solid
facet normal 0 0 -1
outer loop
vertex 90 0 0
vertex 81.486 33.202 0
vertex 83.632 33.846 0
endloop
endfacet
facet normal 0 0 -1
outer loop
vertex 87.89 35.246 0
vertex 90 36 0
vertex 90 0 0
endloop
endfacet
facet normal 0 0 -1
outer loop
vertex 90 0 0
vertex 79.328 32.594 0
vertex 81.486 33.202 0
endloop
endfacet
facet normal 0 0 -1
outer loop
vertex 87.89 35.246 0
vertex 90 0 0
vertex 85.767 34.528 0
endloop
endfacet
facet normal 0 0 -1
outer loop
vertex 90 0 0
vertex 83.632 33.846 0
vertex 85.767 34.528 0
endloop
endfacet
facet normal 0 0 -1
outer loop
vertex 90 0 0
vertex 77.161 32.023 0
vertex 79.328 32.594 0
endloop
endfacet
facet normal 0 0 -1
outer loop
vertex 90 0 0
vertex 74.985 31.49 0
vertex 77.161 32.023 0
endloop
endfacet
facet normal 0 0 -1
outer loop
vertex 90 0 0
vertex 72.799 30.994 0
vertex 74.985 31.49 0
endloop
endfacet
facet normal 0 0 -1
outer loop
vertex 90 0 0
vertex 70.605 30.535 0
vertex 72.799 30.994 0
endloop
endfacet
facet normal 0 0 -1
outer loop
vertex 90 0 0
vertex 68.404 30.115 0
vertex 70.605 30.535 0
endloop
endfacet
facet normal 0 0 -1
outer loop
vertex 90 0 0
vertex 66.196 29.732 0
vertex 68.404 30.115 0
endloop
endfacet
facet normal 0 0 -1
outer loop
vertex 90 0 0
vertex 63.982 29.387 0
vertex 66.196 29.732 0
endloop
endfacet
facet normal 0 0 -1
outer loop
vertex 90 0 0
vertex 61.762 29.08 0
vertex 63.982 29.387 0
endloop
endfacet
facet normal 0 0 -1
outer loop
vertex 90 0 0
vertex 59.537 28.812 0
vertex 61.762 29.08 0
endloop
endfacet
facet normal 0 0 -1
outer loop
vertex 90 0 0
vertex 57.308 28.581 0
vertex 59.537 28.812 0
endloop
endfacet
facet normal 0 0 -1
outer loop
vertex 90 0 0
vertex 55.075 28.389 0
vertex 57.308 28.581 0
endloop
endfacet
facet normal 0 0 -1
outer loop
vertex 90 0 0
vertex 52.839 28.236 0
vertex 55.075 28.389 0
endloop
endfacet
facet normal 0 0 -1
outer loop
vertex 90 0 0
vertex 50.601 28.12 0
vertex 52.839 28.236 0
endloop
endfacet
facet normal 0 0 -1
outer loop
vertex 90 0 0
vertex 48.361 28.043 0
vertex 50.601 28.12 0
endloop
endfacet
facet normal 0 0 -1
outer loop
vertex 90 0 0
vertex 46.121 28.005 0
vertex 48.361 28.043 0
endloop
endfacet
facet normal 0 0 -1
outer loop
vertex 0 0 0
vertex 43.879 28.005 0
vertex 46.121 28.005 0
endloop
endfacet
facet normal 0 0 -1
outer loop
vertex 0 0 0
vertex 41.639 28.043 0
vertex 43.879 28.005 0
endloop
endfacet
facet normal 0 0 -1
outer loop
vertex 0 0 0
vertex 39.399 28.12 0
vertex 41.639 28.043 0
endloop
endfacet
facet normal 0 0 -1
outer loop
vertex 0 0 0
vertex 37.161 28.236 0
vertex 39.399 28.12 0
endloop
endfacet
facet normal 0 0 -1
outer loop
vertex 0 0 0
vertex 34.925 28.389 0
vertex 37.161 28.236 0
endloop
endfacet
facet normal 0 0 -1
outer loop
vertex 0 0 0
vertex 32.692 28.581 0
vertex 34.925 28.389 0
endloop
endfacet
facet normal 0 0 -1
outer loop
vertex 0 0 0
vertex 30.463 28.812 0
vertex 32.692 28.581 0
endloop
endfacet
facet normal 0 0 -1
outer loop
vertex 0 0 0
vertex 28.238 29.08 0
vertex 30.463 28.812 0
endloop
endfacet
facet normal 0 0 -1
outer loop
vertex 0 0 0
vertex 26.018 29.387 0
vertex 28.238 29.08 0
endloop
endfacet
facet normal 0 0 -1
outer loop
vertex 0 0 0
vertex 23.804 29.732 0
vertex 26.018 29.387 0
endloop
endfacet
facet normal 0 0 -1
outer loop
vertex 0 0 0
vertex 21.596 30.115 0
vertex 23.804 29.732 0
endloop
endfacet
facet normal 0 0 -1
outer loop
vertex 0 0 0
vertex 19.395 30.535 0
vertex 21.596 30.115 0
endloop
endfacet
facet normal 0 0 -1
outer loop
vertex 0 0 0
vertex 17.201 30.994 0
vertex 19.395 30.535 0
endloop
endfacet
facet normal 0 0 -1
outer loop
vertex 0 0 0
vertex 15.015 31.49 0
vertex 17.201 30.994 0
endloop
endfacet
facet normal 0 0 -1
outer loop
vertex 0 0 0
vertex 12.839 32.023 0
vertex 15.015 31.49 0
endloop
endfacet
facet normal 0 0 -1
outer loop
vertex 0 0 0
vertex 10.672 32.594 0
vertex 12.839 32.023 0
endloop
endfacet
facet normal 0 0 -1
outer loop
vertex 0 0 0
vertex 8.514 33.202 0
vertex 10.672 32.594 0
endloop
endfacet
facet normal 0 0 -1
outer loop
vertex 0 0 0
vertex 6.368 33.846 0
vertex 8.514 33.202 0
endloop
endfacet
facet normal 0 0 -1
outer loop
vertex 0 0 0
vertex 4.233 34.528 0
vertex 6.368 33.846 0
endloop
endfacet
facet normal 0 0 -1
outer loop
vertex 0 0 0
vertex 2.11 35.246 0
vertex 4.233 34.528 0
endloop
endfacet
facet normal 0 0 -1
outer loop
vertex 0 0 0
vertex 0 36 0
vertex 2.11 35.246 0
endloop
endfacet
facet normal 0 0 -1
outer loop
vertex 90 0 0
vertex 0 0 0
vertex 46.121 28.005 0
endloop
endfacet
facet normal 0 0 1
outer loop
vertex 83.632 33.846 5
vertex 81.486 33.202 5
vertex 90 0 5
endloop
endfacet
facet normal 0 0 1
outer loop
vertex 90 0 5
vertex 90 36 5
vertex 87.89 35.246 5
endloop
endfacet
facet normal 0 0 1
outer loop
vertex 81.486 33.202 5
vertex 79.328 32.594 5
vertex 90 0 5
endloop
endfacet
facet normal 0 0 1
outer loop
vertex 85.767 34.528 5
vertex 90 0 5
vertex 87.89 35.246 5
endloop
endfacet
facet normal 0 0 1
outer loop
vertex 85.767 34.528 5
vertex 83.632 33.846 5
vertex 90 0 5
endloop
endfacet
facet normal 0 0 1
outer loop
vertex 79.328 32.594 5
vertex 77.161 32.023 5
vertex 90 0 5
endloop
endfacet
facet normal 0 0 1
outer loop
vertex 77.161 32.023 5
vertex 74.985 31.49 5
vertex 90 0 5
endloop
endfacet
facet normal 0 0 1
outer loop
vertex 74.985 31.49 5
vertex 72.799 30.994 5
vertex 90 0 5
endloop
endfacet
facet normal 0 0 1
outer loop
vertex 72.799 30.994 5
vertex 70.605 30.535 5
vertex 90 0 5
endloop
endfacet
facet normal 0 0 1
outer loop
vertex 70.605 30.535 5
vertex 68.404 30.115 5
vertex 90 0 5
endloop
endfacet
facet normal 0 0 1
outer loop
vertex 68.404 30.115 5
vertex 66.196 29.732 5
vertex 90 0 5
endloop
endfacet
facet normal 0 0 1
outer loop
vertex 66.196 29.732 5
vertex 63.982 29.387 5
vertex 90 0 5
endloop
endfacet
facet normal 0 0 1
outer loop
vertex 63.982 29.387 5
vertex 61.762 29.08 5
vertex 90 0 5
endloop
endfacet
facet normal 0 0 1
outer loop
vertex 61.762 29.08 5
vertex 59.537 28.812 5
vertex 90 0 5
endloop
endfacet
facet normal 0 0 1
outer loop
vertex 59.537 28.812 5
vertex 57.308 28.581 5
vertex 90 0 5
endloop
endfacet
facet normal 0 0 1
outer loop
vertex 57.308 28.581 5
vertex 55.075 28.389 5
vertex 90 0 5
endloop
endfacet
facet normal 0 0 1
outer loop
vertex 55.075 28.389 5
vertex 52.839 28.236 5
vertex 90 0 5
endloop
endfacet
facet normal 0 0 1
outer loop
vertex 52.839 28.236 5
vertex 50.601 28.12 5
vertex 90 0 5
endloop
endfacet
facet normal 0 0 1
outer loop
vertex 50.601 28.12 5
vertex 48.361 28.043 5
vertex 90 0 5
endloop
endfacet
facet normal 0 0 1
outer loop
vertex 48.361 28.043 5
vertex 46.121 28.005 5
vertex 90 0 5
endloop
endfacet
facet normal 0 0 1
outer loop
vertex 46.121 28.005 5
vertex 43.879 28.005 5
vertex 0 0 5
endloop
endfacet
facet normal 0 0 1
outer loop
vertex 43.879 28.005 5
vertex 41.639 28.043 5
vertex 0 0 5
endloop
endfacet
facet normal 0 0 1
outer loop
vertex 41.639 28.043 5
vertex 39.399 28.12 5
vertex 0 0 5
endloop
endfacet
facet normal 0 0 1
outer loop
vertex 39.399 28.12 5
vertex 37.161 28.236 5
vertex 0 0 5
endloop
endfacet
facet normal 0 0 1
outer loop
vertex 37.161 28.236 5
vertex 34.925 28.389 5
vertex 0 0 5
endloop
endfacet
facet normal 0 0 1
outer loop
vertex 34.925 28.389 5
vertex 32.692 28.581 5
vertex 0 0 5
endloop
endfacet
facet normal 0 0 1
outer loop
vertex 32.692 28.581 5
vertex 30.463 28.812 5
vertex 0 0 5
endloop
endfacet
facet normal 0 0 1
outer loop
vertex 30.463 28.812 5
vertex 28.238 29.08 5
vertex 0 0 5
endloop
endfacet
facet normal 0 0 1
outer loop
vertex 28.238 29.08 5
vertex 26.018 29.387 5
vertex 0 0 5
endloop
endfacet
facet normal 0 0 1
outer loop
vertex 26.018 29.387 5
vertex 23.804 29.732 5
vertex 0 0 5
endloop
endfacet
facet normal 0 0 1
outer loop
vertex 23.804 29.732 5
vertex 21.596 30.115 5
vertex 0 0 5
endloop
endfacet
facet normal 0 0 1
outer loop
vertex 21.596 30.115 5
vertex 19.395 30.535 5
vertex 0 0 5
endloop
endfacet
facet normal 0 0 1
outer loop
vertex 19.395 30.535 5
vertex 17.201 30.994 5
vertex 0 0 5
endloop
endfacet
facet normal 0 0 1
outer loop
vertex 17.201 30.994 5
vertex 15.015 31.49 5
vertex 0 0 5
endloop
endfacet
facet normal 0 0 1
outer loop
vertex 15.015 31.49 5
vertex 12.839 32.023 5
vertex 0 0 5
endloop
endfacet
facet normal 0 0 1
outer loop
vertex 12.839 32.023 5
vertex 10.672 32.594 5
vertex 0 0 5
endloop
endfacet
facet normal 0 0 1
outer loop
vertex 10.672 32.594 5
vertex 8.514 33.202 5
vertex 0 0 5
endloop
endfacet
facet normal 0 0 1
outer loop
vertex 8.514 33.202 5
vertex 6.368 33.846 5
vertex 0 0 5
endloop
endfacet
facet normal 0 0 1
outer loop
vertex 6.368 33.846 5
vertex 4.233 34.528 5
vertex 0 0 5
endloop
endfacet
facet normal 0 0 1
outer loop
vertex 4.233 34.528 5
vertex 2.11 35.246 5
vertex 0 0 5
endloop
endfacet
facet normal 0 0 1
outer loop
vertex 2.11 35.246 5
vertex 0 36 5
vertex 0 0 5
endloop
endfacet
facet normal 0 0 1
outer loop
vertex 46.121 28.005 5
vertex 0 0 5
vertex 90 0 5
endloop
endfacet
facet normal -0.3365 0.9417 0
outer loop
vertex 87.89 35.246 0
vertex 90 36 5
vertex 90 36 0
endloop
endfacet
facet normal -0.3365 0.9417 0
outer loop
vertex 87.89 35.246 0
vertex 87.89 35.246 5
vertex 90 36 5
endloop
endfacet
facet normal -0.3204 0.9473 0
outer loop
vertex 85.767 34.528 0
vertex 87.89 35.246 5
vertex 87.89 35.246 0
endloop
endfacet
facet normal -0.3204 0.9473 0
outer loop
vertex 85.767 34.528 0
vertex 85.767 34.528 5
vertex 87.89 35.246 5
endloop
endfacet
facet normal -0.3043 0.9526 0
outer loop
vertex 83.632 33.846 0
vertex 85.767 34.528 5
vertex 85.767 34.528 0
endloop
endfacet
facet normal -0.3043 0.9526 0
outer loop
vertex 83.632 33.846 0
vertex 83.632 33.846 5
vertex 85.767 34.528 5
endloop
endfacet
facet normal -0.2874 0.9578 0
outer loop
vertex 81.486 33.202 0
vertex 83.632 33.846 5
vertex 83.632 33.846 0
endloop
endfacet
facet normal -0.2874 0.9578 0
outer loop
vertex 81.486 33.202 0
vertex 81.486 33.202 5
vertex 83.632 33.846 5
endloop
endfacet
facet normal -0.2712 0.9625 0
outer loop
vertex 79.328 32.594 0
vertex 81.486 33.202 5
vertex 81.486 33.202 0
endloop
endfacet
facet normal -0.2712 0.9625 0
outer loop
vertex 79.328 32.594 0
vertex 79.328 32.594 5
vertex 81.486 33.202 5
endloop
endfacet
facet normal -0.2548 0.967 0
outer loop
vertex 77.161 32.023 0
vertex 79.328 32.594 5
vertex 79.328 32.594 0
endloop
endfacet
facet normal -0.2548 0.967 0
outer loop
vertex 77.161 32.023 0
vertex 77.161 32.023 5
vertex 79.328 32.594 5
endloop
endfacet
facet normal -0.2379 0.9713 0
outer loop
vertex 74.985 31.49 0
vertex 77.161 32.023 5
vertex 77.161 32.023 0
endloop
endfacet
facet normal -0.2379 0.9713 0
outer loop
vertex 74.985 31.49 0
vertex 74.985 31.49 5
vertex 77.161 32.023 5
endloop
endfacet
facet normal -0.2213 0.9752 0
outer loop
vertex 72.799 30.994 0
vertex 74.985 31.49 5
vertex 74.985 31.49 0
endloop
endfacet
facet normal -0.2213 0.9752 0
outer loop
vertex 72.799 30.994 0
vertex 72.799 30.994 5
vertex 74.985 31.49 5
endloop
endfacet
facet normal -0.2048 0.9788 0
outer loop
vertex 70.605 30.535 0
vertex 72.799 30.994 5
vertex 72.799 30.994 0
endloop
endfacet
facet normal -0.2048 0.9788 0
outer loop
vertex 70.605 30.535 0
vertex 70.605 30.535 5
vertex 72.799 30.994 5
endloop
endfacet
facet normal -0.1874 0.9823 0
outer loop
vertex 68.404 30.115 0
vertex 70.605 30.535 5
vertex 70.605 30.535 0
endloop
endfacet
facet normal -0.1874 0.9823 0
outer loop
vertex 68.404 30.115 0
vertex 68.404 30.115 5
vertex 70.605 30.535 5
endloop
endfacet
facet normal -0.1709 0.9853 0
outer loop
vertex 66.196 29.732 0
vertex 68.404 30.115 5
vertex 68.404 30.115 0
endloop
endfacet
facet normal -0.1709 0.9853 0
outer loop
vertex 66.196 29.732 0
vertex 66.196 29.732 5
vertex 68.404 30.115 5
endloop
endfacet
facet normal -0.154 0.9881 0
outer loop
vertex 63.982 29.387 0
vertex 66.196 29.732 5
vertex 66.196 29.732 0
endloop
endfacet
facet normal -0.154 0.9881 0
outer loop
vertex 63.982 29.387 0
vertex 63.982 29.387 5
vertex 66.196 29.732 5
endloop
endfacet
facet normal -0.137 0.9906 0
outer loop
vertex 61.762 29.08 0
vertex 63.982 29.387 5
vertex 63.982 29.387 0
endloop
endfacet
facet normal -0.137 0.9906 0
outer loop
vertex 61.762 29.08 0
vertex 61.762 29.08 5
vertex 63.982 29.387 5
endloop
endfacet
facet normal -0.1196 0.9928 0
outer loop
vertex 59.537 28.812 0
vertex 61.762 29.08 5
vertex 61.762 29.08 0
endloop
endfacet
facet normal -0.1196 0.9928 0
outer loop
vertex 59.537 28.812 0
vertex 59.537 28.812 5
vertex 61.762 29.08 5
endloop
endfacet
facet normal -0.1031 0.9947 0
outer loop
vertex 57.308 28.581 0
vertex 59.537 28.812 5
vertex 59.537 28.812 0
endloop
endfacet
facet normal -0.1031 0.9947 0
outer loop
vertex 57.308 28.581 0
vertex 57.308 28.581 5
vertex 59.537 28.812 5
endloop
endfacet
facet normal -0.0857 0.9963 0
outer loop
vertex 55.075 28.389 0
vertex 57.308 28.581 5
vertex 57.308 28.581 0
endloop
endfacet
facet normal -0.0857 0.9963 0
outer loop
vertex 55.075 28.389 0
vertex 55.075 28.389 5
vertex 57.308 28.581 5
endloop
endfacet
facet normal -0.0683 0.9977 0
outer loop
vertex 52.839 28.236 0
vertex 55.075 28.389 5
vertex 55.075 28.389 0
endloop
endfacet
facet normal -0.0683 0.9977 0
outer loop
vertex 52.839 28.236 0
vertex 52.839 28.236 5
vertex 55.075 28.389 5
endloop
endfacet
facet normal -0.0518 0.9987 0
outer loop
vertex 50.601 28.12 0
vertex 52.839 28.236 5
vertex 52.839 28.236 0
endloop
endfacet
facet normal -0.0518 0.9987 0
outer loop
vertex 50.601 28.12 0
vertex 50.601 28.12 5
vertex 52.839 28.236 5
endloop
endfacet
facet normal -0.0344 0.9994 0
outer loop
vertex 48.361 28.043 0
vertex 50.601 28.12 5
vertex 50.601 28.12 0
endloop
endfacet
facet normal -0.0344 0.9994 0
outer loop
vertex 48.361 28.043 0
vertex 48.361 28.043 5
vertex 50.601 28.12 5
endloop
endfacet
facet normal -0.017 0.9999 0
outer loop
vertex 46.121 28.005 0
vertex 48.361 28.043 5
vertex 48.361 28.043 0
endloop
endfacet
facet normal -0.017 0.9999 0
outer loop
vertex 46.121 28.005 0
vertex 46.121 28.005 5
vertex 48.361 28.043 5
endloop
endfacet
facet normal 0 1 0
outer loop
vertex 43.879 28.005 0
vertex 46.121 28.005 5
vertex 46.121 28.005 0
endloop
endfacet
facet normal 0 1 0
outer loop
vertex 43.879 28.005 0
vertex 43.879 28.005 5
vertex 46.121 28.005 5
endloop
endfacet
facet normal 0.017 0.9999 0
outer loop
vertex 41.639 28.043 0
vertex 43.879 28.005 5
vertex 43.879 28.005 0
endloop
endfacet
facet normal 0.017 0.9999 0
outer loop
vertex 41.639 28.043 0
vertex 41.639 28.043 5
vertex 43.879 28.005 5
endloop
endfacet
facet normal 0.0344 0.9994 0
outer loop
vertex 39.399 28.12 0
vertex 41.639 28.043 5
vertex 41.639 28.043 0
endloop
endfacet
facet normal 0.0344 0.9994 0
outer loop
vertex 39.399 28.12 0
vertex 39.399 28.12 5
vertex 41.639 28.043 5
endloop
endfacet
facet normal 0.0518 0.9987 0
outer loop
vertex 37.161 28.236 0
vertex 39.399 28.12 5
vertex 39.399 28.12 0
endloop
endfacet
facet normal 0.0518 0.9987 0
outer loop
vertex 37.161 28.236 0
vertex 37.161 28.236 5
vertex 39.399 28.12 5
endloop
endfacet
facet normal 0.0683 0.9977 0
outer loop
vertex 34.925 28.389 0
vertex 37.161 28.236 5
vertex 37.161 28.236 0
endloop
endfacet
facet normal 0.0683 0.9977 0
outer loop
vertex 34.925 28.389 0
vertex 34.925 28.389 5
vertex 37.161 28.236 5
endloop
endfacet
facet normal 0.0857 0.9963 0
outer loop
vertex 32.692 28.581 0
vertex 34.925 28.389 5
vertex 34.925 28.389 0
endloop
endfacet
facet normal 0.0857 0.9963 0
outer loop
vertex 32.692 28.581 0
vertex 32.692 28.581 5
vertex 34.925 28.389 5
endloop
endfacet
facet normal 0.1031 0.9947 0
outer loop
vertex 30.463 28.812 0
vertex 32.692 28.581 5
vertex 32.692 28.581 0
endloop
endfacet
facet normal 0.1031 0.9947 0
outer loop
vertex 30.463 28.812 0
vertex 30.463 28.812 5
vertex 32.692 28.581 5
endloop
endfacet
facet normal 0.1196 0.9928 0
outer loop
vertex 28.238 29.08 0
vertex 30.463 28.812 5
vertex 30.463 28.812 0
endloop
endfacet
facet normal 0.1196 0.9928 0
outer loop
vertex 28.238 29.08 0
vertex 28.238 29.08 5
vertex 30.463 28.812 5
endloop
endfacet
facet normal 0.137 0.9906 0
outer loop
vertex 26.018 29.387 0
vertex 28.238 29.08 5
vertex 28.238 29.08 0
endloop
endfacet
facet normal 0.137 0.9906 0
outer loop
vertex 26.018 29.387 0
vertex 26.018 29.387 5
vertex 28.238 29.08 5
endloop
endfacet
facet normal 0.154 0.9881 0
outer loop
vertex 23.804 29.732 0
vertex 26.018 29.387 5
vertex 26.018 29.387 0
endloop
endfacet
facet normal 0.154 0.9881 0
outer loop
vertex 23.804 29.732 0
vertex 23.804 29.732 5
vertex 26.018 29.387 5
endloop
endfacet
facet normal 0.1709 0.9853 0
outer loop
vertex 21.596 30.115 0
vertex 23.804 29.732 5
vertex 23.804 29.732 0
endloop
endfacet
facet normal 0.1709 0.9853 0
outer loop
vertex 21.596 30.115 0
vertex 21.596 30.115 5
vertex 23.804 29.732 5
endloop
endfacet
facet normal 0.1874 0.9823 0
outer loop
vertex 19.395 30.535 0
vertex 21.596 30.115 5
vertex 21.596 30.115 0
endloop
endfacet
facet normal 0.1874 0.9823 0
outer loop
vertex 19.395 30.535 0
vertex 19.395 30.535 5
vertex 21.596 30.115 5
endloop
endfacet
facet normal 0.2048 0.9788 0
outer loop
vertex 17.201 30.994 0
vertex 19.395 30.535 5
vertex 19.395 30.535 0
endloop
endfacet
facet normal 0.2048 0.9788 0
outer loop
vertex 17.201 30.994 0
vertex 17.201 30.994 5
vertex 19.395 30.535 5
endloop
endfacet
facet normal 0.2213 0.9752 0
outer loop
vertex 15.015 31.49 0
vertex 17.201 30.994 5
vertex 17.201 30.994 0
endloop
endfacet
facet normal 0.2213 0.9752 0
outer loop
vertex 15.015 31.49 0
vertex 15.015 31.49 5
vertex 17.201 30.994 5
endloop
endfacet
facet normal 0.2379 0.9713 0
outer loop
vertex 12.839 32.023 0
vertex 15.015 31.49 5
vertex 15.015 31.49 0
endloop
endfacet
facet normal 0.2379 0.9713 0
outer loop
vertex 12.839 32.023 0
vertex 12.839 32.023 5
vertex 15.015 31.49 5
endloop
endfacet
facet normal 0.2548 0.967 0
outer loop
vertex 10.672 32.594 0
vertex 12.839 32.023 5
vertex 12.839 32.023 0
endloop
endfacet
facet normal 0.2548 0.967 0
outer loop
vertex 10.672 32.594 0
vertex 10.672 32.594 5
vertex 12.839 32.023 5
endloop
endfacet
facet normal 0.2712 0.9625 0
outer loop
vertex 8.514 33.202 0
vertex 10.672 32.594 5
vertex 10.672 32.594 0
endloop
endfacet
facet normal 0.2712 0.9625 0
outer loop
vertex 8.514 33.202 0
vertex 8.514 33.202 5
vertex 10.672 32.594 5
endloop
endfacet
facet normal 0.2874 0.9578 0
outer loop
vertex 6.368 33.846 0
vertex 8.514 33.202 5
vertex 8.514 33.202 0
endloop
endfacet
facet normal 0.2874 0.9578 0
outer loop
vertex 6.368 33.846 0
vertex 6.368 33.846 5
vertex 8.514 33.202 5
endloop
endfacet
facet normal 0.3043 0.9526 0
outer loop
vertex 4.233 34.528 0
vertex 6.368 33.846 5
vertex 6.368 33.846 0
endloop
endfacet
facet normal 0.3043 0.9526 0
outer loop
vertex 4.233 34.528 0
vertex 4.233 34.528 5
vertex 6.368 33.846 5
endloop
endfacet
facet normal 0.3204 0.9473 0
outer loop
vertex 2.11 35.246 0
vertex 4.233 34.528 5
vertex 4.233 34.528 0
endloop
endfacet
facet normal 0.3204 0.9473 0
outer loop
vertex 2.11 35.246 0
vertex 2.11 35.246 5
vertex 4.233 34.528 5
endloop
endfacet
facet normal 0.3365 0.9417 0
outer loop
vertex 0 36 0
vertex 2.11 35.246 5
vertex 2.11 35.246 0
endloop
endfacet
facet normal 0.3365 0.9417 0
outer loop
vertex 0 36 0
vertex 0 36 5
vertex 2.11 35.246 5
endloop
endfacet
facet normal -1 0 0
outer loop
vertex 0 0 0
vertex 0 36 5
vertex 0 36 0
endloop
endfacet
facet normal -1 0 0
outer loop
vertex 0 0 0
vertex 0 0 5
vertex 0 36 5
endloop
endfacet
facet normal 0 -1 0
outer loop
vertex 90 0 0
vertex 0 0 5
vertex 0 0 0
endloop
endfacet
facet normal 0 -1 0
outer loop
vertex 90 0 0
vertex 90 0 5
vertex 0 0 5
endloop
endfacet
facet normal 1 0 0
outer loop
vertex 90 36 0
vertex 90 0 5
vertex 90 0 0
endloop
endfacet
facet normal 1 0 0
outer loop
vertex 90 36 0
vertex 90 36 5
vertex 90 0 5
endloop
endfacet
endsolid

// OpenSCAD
$fn = 32;

// ----------------------------------------------------------------------
// Arc profile plate: notch, 44 points
// ----------------------------------------------------------------------

// --- parameters (mm) ---
bar_l = 90;               // bar length, X
bar_w = 36;               // bar width, Y
notch_depth = 8;          // depth of the arc notch at mid-span
arc_r = 130.56;           // radius of the notch arc
arc_angle = 40.32;        // notch arc angle, degrees
arc_step = 1;             // sampling step of the notch arc, degrees
plate_t = 5;              // plate thickness, Z

profile = [[0, 0], [90, 0], [90, 36], [87.89, 35.246], [85.767, 34.528], [83.632, 33.846], [81.486, 33.202], [79.328, 32.594], [77.161, 32.023], [74.985, 31.49], [72.799, 30.994], [70.605, 30.535], [68.404, 30.115], [66.196, 29.732], [63.982, 29.387], [61.762, 29.08], [59.537, 28.812], [57.308, 28.581], [55.075, 28.389], [52.839, 28.236], [50.601, 28.12], [48.361, 28.043], [46.121, 28.005], [43.879, 28.005], [41.639, 28.043], [39.399, 28.12], [37.161, 28.236], [34.925, 28.389], [32.692, 28.581], [30.463, 28.812], [28.238, 29.08], [26.018, 29.387], [23.804, 29.732], [21.596, 30.115], [19.395, 30.535], [17.201, 30.994], [15.015, 31.49], [12.839, 32.023], [10.672, 32.594], [8.514, 33.202], [6.368, 33.846], [4.233, 34.528], [2.11, 35.246], [0, 36]];  // primary outline, 44 points, counter clockwise

// --- the one profile operation ---
linear_extrude(height = plate_t) polygon(points = profile);
